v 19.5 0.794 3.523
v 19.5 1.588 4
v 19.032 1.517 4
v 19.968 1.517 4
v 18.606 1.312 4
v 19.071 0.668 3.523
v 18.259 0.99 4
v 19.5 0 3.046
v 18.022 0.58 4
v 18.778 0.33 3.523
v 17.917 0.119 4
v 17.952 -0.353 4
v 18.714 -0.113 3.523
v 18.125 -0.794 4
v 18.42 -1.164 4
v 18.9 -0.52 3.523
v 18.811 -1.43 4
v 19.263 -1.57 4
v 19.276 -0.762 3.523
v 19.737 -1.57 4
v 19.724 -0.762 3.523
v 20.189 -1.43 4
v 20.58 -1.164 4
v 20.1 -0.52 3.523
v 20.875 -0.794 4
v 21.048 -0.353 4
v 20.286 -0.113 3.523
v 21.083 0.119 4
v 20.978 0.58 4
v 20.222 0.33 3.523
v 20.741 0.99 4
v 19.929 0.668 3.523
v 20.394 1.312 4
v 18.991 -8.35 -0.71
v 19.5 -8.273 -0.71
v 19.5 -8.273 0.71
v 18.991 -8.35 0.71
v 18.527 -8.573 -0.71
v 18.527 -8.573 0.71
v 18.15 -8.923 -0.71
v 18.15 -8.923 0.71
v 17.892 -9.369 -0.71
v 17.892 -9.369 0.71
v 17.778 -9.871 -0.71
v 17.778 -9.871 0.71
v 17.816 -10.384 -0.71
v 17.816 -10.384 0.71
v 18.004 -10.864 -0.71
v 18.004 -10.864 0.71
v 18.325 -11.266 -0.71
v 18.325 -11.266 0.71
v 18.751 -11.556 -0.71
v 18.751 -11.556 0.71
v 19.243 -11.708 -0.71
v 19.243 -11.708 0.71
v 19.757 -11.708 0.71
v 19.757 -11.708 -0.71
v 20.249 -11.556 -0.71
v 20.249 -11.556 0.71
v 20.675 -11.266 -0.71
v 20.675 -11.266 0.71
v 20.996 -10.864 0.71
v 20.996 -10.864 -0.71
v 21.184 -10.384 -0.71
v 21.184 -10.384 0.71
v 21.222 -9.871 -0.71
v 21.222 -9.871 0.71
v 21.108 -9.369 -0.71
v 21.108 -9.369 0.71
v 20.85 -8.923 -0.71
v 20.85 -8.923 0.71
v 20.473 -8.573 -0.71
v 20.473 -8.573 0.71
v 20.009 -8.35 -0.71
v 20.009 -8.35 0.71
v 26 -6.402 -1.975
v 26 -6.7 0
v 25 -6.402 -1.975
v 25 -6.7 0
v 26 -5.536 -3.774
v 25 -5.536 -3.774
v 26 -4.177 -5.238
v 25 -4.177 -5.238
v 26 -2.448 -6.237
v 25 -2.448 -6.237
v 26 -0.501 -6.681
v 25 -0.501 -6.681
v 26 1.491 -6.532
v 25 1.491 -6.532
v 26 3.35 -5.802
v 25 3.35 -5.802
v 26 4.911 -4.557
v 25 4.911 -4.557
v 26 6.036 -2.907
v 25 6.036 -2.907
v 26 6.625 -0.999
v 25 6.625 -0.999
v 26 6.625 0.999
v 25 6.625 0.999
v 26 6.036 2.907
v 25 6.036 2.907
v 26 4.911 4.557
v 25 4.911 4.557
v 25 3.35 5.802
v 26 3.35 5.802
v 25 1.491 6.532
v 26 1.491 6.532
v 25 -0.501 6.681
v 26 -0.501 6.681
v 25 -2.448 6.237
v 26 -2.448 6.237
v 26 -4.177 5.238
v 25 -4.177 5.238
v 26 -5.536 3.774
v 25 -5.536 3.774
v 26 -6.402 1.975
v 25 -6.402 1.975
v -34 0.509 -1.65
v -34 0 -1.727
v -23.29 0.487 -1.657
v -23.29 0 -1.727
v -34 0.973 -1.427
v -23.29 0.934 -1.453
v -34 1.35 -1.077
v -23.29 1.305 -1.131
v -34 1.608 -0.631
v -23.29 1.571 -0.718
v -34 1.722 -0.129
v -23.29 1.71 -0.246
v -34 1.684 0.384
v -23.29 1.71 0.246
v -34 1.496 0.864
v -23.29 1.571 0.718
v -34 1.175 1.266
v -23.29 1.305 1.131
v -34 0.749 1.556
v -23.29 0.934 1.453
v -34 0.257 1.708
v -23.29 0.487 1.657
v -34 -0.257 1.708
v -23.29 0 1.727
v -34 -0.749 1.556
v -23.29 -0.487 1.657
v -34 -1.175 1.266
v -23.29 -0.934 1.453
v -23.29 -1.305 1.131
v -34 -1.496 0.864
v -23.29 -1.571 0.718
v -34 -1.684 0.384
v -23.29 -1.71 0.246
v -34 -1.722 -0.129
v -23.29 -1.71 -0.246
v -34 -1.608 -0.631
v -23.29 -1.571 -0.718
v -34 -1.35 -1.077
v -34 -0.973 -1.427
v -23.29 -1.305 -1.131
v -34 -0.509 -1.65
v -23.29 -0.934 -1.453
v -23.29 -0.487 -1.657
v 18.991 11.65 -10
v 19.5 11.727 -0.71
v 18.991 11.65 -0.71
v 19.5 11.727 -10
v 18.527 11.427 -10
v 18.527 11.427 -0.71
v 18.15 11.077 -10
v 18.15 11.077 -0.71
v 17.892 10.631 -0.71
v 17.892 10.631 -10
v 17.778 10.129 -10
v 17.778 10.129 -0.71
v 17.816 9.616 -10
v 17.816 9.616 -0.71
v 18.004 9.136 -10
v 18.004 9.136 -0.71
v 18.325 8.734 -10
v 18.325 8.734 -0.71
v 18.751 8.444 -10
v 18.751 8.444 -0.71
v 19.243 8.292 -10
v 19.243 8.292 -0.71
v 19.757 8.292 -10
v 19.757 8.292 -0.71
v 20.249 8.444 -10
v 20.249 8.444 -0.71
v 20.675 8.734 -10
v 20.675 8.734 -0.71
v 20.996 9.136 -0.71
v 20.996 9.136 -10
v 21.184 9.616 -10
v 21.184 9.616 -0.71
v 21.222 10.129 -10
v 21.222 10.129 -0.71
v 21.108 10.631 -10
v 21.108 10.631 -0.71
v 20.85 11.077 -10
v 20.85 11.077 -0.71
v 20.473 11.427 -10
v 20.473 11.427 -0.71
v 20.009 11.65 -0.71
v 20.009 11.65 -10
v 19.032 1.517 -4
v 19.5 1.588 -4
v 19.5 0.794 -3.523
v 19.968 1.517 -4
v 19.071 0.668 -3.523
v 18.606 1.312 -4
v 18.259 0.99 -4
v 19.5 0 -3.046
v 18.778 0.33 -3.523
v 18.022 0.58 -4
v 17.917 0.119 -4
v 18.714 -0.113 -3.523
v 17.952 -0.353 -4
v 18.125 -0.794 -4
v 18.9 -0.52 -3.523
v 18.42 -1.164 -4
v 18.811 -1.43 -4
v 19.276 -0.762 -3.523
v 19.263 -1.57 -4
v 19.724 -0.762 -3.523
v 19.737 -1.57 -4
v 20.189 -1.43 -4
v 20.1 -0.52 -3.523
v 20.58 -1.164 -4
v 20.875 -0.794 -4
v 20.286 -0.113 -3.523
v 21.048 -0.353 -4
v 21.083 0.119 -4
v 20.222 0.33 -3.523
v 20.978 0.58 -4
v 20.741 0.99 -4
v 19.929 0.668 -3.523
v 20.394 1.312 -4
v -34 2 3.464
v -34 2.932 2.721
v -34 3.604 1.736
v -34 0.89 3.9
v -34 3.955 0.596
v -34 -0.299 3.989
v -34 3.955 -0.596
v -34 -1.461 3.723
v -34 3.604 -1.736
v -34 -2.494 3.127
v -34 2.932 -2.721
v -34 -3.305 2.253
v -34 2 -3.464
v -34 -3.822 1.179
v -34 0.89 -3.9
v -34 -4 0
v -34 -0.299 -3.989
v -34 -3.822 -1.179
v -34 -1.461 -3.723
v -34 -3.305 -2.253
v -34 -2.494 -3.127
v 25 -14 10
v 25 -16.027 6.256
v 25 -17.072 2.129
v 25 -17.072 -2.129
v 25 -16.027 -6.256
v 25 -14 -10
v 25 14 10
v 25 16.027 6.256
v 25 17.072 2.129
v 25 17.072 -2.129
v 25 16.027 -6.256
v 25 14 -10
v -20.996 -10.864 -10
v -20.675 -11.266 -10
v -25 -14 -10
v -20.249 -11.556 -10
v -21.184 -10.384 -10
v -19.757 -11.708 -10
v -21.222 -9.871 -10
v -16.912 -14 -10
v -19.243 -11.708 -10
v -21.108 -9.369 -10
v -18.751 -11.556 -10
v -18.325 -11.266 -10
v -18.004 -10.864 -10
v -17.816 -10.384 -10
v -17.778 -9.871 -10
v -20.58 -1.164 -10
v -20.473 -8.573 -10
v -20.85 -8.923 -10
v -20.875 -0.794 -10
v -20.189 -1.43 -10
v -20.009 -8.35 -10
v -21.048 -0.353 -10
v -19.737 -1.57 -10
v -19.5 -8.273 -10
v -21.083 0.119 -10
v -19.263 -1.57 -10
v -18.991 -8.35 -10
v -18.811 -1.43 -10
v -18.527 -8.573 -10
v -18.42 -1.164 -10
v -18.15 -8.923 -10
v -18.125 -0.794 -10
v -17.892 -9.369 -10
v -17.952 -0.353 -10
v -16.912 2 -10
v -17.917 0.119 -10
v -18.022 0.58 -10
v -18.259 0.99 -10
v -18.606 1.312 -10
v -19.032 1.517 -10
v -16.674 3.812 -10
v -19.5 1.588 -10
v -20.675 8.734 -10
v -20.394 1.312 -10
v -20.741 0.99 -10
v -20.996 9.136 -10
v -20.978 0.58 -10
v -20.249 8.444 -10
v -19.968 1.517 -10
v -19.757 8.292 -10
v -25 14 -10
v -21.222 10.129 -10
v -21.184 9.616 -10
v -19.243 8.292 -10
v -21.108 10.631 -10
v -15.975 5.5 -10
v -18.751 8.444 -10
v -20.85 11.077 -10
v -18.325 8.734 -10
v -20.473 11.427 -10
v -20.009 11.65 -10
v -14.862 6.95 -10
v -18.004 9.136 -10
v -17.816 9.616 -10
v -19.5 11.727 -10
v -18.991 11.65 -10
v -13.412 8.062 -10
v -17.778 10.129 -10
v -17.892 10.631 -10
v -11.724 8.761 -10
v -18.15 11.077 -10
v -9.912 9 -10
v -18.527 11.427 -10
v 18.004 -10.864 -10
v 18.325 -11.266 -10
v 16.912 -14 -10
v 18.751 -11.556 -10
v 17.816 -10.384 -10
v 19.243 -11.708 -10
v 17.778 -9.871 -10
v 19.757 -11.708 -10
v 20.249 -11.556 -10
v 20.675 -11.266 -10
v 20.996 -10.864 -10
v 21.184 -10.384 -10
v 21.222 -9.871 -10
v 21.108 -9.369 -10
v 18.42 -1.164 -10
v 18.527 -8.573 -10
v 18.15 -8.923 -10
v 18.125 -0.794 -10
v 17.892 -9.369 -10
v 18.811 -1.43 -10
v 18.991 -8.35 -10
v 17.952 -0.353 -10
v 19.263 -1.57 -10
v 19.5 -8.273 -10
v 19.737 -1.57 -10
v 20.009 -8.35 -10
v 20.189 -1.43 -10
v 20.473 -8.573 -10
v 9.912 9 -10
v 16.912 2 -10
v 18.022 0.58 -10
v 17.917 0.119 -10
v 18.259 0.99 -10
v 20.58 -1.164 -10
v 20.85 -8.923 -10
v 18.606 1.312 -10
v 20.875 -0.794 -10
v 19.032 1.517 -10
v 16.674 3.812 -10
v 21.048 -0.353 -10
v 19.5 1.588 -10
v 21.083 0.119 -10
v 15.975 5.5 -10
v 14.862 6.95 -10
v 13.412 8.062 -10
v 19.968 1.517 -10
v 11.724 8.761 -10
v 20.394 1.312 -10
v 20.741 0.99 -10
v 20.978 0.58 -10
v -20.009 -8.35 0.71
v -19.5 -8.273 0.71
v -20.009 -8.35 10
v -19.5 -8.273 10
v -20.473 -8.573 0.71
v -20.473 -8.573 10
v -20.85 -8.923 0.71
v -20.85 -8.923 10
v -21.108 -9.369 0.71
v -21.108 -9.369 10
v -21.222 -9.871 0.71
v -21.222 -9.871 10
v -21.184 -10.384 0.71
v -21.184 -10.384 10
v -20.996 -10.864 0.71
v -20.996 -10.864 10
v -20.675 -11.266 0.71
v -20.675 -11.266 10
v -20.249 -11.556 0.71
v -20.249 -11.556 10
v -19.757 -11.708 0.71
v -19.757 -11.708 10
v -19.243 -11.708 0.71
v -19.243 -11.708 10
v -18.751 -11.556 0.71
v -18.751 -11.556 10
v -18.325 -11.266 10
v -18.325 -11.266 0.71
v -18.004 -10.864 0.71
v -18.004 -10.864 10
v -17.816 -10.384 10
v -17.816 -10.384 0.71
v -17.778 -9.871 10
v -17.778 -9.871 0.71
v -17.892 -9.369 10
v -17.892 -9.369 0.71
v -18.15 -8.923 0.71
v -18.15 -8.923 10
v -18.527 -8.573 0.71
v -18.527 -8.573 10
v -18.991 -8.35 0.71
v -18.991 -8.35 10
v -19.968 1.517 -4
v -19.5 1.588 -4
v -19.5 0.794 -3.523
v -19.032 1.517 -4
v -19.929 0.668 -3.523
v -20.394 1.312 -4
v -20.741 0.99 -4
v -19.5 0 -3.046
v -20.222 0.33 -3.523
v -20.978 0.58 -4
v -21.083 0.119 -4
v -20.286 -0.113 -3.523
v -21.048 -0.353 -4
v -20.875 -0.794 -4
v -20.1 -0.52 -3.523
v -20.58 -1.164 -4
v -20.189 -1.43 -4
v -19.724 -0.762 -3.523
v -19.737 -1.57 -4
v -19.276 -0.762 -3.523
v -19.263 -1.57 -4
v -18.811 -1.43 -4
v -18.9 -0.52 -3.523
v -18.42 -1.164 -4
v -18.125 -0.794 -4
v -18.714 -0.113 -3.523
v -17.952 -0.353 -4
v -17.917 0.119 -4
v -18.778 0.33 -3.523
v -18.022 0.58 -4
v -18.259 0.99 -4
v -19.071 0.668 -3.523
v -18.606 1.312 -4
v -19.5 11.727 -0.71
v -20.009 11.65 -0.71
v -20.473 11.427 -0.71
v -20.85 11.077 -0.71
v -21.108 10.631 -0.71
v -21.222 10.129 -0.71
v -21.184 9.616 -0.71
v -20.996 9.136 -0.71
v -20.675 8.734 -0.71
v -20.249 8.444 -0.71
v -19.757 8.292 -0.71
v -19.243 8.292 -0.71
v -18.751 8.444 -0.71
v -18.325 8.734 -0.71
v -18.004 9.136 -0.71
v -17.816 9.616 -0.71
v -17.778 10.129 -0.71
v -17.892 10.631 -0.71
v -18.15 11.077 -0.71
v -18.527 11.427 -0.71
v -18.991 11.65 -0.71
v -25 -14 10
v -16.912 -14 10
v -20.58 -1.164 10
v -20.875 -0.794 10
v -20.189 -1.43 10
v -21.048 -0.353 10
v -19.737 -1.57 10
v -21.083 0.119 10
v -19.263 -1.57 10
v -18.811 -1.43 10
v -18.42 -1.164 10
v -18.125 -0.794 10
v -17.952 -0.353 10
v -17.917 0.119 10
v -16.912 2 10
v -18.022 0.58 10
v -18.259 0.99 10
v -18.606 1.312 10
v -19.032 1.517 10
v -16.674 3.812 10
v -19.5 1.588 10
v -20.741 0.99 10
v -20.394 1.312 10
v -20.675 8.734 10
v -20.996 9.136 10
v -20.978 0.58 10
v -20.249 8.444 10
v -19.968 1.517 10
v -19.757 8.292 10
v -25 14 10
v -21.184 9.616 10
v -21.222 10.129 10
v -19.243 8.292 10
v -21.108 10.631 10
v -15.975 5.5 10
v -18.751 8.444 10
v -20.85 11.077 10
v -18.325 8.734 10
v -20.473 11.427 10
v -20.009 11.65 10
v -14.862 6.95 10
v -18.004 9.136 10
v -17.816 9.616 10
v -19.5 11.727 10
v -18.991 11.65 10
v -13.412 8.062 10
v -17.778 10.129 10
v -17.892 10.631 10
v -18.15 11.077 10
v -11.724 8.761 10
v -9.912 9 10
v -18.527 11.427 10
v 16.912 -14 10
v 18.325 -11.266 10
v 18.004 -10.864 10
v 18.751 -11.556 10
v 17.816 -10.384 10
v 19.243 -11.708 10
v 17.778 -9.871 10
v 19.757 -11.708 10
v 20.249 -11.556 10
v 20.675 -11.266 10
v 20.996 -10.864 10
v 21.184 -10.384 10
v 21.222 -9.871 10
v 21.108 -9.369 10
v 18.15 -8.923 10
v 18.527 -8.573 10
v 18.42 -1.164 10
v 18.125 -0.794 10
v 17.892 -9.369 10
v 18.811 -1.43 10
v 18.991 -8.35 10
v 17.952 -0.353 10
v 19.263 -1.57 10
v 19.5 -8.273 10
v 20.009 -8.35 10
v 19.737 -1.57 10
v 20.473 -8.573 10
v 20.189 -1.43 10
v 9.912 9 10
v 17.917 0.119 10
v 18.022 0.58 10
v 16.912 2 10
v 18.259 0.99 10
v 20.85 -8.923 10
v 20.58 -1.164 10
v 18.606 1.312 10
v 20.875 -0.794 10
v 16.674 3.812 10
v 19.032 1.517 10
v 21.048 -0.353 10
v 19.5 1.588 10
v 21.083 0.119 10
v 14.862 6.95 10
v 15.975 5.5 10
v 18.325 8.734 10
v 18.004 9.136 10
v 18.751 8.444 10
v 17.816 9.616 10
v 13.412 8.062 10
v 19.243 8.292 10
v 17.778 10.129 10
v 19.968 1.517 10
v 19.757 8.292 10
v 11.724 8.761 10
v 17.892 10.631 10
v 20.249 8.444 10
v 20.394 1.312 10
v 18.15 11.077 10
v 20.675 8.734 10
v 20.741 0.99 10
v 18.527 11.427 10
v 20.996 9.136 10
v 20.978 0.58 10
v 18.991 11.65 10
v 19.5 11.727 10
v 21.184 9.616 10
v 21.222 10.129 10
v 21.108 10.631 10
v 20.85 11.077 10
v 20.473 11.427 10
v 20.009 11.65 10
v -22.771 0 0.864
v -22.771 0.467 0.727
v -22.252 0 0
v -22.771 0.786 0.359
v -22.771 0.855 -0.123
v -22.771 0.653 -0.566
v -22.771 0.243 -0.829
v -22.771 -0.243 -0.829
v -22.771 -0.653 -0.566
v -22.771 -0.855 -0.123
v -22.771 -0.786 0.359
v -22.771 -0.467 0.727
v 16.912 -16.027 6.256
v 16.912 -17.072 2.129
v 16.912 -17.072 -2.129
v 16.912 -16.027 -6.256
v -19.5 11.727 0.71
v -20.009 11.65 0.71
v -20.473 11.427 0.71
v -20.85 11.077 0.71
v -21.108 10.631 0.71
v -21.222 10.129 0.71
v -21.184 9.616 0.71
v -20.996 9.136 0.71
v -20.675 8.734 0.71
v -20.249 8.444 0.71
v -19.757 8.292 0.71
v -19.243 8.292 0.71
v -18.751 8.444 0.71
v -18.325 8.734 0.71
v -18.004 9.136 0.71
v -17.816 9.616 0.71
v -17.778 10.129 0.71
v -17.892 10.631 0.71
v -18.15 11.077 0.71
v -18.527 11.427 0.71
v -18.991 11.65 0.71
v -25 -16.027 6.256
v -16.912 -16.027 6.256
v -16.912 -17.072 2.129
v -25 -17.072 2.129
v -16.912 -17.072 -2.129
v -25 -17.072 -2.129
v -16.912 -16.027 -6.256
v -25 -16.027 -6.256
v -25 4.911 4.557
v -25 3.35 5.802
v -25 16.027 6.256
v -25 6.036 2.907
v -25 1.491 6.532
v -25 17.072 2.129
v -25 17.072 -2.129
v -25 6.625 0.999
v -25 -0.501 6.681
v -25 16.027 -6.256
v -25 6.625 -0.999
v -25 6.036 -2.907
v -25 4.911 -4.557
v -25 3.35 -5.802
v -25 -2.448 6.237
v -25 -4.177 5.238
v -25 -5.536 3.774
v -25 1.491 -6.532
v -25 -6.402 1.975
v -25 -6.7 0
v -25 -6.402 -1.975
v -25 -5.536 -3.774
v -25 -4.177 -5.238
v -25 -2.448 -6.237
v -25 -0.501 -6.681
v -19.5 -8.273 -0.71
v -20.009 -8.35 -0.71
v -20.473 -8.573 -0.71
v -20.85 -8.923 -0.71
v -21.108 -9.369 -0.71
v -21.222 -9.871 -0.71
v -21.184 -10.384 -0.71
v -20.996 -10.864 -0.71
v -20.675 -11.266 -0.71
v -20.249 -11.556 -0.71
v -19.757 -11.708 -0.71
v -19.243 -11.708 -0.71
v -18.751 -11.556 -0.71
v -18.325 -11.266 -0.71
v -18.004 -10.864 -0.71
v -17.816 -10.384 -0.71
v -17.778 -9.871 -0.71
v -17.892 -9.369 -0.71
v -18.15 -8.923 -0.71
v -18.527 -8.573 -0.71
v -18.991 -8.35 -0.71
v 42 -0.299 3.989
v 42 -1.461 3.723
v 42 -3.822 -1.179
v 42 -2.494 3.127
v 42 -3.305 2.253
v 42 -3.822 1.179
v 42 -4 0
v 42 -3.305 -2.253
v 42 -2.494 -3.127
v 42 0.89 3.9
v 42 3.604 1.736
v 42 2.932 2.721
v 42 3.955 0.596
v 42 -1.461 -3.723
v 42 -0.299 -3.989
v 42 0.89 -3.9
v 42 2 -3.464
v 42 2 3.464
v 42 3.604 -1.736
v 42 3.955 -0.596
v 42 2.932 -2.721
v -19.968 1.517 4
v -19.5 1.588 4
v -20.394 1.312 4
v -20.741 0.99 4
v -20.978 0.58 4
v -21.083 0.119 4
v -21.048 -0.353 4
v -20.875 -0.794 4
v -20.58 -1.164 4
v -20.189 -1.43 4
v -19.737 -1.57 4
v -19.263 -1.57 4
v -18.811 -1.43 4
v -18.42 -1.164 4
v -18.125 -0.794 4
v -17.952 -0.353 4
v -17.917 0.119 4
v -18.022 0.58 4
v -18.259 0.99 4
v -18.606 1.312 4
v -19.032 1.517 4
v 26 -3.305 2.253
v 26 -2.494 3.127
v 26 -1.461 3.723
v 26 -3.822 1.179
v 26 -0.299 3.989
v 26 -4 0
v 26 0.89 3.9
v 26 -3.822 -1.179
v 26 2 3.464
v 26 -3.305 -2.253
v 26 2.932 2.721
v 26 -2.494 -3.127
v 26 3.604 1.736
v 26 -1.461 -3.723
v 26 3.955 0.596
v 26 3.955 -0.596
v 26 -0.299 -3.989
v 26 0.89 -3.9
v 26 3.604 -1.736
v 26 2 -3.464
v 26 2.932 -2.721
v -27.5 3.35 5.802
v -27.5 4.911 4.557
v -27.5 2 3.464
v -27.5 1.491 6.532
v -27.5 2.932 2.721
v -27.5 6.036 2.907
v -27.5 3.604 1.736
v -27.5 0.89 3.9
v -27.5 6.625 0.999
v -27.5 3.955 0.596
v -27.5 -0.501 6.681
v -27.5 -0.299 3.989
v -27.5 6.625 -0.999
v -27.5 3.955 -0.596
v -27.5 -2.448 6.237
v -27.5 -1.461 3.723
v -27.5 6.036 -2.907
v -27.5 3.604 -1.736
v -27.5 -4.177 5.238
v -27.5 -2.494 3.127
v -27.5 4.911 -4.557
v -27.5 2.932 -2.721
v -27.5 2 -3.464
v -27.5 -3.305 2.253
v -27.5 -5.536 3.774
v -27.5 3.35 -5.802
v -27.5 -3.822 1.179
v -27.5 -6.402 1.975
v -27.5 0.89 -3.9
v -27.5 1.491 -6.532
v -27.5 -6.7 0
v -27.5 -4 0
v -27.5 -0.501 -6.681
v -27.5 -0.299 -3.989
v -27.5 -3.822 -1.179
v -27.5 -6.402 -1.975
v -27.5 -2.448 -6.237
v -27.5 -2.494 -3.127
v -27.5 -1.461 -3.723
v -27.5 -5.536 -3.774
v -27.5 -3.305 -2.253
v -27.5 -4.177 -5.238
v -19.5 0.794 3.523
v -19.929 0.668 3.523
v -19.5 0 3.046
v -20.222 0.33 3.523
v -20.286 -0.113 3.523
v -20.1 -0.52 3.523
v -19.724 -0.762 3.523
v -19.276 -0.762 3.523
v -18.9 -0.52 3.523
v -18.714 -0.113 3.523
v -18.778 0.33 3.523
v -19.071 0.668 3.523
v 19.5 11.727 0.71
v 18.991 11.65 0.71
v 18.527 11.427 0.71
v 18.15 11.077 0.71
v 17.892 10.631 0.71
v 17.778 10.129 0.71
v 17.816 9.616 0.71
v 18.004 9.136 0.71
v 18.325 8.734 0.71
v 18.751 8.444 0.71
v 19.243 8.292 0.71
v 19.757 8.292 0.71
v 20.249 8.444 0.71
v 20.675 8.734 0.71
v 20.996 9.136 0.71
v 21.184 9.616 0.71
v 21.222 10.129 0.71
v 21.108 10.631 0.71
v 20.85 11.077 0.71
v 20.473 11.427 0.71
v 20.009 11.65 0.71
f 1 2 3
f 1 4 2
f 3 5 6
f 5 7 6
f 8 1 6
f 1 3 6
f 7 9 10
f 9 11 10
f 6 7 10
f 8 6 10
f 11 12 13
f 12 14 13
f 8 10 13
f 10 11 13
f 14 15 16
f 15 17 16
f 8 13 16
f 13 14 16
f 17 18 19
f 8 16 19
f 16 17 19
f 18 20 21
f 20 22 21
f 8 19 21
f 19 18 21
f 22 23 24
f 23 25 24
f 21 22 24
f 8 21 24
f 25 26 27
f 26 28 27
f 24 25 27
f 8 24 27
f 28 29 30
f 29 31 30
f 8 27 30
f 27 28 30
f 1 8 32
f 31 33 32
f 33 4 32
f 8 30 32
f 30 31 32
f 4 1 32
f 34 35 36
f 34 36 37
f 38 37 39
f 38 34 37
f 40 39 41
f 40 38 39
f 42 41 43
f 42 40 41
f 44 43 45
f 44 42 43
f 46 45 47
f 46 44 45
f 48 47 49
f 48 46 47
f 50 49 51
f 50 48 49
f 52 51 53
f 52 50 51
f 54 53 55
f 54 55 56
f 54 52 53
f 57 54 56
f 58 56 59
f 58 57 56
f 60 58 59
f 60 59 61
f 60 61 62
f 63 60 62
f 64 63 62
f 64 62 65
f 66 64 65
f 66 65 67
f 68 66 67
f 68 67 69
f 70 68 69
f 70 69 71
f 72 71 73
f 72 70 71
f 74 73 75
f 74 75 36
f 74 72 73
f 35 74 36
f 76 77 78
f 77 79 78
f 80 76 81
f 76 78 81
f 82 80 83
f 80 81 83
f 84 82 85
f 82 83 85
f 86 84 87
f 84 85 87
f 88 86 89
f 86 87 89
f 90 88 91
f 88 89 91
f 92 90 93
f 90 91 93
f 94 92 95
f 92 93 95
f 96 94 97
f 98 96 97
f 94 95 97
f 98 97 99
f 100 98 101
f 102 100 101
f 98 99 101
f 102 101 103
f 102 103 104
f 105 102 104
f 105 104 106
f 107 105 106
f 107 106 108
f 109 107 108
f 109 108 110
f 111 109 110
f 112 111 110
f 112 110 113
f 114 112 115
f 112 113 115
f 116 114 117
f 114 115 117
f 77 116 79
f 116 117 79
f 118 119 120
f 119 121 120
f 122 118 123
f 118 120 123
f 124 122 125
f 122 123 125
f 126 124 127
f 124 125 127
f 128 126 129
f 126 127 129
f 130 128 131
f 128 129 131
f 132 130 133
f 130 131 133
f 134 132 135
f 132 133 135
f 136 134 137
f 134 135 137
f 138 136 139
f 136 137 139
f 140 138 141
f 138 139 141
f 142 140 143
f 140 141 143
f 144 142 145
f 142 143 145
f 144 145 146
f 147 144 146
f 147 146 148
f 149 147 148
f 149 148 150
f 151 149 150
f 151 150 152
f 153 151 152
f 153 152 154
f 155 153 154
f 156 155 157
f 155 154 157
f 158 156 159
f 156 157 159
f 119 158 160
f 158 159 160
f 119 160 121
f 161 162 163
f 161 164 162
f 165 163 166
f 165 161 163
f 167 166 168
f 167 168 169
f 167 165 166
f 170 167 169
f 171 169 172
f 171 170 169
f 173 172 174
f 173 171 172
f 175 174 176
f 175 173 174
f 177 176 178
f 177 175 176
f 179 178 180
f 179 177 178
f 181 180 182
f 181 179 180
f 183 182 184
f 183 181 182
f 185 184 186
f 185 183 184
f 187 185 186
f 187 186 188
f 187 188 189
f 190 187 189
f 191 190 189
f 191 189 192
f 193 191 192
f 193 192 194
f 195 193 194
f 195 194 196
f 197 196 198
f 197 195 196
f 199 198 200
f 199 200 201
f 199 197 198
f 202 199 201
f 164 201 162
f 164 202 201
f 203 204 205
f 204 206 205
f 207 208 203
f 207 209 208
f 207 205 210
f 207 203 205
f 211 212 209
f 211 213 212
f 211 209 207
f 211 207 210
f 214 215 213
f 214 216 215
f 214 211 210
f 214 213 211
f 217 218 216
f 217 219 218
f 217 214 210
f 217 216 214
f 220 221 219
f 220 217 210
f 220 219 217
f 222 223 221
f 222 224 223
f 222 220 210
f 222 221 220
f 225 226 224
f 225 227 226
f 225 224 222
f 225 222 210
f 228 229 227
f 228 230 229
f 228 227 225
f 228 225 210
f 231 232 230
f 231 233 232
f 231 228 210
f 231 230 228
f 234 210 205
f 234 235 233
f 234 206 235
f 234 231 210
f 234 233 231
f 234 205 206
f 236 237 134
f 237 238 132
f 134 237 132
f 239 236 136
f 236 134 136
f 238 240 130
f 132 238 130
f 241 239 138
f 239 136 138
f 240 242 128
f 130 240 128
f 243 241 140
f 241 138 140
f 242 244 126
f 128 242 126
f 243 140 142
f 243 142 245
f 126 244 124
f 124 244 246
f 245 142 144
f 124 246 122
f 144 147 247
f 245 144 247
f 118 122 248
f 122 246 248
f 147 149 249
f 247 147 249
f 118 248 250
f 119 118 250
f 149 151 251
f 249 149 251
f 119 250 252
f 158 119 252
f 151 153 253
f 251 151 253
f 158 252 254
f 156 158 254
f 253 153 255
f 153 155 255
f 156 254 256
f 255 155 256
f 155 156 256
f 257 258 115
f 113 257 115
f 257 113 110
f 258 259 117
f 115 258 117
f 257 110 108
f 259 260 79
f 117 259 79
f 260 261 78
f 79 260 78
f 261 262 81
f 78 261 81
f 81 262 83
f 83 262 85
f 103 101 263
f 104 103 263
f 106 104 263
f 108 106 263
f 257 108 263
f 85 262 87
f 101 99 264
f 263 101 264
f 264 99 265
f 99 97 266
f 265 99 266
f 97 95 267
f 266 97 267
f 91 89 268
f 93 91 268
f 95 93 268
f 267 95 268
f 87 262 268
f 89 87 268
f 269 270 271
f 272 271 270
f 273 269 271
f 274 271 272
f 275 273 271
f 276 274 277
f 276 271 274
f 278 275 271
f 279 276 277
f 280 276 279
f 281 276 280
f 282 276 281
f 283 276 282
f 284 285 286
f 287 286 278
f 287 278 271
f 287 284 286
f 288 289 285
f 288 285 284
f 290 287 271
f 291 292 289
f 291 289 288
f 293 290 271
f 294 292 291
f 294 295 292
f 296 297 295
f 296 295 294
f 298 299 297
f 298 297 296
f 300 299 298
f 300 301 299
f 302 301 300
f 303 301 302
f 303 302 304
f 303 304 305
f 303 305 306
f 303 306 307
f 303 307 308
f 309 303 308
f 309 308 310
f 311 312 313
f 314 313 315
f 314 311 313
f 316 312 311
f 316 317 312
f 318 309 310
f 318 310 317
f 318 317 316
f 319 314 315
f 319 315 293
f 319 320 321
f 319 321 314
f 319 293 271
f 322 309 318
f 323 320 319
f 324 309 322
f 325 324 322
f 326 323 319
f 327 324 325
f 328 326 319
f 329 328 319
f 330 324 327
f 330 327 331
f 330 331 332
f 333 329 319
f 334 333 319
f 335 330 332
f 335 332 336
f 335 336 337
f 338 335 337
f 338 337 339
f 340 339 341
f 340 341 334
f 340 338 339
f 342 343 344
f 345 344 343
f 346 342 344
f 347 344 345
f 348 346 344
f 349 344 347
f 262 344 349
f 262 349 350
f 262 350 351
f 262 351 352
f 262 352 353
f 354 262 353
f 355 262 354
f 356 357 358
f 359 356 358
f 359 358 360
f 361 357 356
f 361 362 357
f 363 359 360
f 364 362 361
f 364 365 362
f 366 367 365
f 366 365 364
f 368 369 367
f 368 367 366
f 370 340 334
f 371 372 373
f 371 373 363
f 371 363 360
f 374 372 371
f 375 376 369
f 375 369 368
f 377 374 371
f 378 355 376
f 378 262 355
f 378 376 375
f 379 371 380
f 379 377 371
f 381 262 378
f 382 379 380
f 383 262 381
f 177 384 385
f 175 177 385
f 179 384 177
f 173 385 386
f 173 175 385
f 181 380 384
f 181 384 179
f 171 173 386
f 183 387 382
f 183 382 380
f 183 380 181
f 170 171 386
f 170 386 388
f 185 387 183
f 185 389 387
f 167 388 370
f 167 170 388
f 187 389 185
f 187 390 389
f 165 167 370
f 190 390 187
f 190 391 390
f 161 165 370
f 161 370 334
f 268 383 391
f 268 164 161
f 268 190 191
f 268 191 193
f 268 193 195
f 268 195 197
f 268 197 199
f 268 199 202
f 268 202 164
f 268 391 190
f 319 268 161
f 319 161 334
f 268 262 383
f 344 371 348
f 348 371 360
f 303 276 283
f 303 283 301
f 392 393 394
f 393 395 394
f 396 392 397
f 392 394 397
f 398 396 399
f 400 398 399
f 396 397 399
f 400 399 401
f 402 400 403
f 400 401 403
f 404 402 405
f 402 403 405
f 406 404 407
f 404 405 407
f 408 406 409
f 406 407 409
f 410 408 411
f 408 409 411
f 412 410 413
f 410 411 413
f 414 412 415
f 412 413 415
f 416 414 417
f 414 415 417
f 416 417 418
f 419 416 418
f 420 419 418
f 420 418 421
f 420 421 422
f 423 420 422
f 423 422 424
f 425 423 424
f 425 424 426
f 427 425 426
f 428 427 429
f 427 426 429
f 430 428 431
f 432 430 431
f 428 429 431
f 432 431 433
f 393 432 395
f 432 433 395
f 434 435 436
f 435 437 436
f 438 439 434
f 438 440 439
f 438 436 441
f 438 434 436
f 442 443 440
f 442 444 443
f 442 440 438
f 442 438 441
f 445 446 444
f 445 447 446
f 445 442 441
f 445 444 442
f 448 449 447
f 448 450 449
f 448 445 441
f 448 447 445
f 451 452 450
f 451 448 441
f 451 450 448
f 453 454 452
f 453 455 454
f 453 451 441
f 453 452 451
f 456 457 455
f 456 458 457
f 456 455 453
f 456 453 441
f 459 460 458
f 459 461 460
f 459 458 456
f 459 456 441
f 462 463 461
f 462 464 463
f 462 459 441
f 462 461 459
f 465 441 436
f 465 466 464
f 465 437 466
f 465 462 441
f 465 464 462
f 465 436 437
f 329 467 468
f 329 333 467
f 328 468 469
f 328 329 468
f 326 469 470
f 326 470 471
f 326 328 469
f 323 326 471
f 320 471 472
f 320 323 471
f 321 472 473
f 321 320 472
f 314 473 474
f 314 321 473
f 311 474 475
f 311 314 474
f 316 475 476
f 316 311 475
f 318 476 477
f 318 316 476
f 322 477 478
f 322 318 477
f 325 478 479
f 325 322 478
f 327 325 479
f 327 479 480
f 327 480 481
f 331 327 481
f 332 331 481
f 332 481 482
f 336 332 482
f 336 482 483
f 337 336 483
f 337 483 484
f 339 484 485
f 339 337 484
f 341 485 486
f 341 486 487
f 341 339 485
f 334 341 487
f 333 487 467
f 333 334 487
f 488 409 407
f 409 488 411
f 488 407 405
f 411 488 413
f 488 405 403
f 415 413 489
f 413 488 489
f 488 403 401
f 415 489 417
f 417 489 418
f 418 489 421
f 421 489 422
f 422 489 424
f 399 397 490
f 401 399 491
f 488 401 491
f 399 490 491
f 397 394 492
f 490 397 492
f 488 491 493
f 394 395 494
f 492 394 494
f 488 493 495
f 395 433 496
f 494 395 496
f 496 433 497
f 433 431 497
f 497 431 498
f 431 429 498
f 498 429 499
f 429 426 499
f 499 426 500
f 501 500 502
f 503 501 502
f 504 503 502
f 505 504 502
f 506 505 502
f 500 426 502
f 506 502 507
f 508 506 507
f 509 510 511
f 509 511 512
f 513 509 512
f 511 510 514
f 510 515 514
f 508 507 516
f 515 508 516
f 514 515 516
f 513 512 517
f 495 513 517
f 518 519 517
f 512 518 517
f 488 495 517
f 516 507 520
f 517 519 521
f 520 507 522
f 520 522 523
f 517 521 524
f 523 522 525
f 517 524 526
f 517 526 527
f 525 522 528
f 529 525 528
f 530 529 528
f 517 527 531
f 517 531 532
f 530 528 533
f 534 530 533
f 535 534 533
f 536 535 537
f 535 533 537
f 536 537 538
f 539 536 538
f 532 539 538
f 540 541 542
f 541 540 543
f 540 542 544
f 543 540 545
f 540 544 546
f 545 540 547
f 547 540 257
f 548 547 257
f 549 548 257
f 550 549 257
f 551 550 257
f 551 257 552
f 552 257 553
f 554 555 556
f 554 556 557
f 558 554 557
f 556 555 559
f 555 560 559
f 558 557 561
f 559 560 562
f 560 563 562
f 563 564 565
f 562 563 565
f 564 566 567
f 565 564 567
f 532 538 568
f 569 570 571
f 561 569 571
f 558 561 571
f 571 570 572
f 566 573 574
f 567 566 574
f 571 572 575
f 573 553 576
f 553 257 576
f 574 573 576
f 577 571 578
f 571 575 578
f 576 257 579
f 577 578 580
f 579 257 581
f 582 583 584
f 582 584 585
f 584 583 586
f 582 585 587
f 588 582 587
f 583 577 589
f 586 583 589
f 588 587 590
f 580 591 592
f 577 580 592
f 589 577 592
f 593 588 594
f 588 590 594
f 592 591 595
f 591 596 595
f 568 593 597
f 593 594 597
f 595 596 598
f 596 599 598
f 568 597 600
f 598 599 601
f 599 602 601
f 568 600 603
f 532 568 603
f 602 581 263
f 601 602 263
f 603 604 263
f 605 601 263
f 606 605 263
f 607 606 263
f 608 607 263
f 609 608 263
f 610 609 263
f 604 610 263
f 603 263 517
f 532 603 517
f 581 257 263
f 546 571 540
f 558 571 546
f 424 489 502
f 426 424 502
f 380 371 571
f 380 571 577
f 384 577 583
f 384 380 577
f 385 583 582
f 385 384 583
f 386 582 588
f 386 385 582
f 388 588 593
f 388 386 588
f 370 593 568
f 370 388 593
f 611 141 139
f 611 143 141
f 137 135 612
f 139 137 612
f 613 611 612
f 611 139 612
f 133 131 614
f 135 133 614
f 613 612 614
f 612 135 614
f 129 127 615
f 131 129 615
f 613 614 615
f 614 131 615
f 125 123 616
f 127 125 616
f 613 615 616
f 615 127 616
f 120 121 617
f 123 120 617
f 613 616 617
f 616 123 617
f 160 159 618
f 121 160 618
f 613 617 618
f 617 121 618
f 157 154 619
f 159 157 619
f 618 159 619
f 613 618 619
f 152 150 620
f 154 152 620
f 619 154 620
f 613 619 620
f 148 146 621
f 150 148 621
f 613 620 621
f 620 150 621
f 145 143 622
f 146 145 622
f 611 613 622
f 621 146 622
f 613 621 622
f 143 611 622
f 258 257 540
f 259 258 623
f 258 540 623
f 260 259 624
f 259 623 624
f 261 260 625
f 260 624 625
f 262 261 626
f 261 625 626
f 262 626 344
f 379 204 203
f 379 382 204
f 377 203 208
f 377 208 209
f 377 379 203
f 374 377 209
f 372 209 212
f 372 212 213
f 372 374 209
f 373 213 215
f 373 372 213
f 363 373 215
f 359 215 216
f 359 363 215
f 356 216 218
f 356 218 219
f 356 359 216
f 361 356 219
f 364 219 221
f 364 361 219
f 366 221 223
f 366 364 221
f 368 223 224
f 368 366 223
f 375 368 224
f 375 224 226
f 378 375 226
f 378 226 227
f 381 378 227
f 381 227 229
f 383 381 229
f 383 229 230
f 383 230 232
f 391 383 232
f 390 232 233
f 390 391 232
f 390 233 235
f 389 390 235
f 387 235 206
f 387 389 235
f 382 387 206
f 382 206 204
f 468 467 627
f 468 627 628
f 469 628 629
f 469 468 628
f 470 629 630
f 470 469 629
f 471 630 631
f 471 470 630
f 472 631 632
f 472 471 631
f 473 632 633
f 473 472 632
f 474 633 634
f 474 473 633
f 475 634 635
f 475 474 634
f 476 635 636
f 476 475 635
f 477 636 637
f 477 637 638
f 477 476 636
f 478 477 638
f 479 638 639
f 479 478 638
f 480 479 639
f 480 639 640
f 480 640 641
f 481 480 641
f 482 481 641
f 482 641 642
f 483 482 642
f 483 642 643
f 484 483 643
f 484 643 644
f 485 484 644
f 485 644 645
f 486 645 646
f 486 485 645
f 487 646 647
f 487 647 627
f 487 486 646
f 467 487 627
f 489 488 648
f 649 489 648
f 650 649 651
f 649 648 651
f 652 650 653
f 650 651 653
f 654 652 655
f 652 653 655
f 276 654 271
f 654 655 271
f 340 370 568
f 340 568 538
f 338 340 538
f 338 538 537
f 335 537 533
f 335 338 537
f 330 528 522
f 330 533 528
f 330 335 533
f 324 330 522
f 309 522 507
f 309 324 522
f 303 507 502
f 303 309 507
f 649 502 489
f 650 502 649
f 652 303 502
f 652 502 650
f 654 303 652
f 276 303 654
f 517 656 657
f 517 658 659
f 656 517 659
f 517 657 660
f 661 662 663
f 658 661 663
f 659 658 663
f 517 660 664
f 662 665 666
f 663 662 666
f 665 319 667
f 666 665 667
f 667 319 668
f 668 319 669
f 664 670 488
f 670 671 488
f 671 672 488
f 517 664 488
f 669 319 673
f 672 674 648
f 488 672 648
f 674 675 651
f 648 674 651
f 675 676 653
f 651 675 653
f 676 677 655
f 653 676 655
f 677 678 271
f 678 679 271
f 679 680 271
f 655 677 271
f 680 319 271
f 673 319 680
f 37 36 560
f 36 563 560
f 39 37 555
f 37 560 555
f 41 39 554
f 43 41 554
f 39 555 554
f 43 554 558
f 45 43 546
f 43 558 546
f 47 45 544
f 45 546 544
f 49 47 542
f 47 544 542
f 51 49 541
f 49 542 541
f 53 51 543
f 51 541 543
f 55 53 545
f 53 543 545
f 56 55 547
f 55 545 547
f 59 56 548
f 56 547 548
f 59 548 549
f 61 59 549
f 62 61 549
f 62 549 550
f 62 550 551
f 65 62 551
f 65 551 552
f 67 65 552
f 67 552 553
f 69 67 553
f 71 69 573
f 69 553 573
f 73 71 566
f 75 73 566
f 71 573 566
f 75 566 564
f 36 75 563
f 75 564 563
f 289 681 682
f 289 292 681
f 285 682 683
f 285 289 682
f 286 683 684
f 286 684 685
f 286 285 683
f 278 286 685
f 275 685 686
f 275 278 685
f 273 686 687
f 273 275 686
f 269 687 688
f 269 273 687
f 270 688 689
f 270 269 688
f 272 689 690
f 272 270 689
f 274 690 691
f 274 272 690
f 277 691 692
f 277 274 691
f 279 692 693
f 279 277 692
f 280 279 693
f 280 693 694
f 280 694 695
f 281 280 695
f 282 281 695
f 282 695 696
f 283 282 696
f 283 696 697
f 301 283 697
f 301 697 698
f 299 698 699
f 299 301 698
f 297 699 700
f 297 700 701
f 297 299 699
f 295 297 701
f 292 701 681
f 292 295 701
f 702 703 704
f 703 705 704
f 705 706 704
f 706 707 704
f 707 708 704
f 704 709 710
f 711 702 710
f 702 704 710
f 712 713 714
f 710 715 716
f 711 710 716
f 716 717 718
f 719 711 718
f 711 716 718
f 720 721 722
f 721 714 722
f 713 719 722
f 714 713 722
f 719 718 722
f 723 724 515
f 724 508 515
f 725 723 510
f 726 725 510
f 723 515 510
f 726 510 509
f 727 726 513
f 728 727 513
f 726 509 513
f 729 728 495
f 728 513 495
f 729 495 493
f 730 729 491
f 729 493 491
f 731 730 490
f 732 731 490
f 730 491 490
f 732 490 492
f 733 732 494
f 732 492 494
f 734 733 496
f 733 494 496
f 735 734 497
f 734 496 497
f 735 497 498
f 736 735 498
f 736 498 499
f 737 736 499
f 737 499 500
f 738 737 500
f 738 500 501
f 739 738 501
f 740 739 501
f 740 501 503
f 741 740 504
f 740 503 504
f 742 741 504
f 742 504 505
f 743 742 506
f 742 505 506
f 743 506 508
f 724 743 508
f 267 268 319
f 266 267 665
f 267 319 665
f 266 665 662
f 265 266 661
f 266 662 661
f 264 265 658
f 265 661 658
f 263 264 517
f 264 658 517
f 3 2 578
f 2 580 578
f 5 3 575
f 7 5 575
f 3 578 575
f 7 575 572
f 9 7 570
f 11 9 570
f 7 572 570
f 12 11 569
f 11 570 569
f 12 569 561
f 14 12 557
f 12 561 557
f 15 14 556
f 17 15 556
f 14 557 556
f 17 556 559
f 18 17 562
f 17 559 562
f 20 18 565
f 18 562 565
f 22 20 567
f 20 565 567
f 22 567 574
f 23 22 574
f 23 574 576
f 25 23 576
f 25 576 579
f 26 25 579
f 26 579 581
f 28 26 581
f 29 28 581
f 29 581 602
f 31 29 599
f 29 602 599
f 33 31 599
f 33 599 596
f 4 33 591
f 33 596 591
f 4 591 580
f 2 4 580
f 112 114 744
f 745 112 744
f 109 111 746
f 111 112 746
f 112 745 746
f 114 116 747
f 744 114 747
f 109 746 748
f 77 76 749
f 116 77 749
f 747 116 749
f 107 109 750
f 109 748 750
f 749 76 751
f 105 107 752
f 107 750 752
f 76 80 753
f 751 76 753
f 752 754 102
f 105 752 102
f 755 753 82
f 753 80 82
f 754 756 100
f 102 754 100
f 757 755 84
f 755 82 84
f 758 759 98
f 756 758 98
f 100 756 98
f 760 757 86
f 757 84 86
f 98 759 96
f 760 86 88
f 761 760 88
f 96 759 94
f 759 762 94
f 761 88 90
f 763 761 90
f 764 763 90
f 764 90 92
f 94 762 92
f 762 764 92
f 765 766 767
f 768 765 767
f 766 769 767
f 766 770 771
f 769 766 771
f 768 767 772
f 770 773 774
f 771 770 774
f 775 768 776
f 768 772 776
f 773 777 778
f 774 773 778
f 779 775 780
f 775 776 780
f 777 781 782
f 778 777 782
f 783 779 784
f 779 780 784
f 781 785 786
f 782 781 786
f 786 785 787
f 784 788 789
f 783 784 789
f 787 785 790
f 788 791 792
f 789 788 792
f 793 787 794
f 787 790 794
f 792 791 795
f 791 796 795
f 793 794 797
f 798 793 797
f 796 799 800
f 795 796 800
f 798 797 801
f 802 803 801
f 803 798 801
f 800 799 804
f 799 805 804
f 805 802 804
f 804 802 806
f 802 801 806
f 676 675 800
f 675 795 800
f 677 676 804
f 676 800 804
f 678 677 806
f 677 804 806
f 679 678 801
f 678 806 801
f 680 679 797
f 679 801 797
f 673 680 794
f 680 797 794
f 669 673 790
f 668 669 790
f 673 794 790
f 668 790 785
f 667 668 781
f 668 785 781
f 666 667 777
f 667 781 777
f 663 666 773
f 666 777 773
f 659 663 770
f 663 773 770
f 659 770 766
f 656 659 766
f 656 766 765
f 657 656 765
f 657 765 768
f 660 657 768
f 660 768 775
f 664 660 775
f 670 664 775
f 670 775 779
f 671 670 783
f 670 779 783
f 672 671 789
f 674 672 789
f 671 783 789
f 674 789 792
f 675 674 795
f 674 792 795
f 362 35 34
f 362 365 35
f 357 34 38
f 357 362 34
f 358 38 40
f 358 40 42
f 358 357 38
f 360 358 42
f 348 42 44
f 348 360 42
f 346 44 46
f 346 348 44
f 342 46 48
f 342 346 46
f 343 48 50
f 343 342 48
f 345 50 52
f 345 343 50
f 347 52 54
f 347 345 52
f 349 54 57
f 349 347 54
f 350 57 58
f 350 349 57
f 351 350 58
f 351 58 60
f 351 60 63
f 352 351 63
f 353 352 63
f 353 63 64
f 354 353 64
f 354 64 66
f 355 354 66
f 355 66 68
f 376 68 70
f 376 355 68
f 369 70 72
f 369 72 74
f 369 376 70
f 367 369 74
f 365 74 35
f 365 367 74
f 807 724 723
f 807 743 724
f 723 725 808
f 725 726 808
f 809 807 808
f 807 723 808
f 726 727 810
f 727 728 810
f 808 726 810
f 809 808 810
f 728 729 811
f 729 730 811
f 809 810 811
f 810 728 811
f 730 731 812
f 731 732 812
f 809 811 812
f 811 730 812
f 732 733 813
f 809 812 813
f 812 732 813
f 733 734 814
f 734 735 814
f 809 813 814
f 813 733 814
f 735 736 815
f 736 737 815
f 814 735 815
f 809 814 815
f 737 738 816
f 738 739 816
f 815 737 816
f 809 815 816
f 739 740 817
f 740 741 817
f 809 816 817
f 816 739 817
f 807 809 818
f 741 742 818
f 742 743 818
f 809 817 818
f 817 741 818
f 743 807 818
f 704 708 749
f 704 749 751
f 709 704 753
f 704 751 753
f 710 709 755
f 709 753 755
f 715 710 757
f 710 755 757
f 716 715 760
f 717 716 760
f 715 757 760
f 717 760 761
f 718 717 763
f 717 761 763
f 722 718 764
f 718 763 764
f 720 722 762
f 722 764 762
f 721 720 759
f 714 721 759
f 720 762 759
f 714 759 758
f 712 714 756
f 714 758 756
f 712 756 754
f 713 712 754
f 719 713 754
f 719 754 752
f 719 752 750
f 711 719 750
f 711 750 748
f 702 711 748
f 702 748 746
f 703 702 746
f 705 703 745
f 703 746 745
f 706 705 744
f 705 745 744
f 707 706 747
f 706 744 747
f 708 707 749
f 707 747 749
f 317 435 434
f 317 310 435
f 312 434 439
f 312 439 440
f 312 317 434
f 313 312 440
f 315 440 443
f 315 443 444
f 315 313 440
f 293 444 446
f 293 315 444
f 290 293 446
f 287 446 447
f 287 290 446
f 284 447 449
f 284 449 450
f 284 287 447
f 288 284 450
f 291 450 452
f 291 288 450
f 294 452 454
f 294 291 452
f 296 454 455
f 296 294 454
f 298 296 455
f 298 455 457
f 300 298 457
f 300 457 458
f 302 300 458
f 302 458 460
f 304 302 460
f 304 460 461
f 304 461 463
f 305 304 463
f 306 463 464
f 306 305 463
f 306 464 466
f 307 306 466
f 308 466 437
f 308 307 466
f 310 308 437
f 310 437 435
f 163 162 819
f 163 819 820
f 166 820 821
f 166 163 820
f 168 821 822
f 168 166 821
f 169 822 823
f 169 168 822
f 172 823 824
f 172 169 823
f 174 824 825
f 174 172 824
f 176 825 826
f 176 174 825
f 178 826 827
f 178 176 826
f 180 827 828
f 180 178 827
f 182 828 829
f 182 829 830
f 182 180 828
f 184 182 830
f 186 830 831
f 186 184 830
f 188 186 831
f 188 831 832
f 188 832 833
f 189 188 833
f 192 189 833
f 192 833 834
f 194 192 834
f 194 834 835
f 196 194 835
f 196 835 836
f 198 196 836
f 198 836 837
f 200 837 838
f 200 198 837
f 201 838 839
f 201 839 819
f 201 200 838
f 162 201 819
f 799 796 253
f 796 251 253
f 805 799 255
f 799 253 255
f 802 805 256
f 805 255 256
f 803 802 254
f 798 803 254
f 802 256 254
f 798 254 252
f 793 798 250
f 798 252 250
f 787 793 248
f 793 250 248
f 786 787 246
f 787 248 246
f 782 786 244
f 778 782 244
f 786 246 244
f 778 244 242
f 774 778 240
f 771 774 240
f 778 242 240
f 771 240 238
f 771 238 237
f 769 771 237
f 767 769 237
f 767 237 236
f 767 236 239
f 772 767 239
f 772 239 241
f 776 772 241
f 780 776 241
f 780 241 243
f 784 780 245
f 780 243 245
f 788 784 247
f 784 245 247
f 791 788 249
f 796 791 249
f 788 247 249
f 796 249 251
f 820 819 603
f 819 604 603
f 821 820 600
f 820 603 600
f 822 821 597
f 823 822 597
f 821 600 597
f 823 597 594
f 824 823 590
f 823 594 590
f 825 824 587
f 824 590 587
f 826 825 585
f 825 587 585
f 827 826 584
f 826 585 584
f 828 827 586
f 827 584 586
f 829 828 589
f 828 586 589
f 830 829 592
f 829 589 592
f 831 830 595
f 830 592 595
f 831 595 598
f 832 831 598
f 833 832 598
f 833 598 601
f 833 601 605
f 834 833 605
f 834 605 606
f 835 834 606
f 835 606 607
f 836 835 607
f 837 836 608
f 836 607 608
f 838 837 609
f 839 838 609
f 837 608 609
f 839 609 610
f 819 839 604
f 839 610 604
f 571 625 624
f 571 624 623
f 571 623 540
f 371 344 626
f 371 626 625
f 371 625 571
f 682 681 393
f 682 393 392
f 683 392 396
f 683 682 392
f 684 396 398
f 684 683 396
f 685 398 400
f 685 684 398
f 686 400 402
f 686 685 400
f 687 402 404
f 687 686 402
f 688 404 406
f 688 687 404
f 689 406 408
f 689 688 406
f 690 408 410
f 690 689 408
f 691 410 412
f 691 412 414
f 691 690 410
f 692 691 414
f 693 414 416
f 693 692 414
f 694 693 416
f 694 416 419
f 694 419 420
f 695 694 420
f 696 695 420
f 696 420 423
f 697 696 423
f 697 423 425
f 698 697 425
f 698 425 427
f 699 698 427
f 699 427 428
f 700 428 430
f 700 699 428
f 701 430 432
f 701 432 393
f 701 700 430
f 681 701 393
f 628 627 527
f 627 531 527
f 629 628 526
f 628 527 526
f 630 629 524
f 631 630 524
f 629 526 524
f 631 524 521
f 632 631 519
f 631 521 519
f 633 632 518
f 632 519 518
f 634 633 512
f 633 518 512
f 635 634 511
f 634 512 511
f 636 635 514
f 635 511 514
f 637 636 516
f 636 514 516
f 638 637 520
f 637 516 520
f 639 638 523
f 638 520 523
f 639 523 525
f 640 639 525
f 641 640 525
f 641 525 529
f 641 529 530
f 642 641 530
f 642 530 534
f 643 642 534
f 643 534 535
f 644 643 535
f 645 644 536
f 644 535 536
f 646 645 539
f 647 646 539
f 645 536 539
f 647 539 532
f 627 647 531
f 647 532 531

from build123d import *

# Parameters (mm, degrees)
CUT_EXTRUDE1_DEPTH                  = 72.281133549
CUT_EXTRUDE1_DEPTH_BACK             = 72.281133549
SKETCH3_OUTSIDE_W                   = 54.458
SKETCH3_OUTSIDE_H                   = 54.458
SKETCH3_OUTSIDE_W_2                 = 20
SKETCH3_OUTSIDE_H_2                 = 34.409301068
F_8_32_TAPPED_HOLE1_AT_2_COUNT      = 2
F_8_32_TAPPED_HOLE1_AT_2_PITCH      = 43.829214002
F_8_32_TAPPED_HOLE1_AT_3_COUNT      = 2
F_8_32_TAPPED_HOLE1_AT_3_PITCH      = 20
F_8_32_TAPPED_HOLE1_AT_4_COUNT      = 2
F_8_32_TAPPED_HOLE1_AT_4_PITCH      = 39
F_1_8_0_1250_DOWEL_HOLE1_AT_2_COUNT = 2
F_1_8_0_1250_DOWEL_HOLE1_AT_2_PITCH = 39
F_8_32_TAPPED_HOLE2_D               = 3.4544
F_8_32_TAPPED_HOLE2_DEPTH           = 10.71
F_8_32_TAPPED_HOLE2_TIP             = 1.037806461
CUT_EXTRUDE3_DEPTH                  = 50.598387071
CUT_EXTRUDE3_DEPTH_BACK             = 50.598387071


with BuildPart() as part:
    # Sketch2 → Revolve1 (revolve)
    with BuildSketch(Plane.XY, mode=Mode.PRIVATE) as revolve1_sk:
        Polygon((-34, 0), (42, 0), (42, 4), (26, 4), (26, 6.7), (25, 6.7), (25, 17.204650534), (-25, 17.204650534), (-25, 6.7), (-27.5, 6.7), (-27.5, 4), (-34, 4), align=None)
    revolve(revolve1_sk.sketch.rotate(Axis((-34, 0, 0), (1, 0, 0)), 180), axis=Axis((-34, 0, 0), (1, 0, 0)))

    # Sketch3 outside → Cut-Extrude1 (cut, two sides: drawn at the far end of the back side and taken through both)
    with BuildSketch(Plane.ZY.offset(25).offset(-CUT_EXTRUDE1_DEPTH_BACK)):
        Rectangle(SKETCH3_OUTSIDE_W, SKETCH3_OUTSIDE_H)
        Rectangle(SKETCH3_OUTSIDE_W_2, SKETCH3_OUTSIDE_H_2, mode=Mode.SUBTRACT)
    extrude(amount=CUT_EXTRUDE1_DEPTH + CUT_EXTRUDE1_DEPTH_BACK, mode=Mode.SUBTRACT)

    # Sketch5 → #8-32 Tapped Hole1 (revolve, cut)
    with BuildSketch(Plane(origin=(19.5, 10, -10), x_dir=(0, 1, 0), z_dir=(1, 0, 0))):
        Polygon((0, 0), (0, 11.747806461), (1.7272, 10.71), (1.7272, 0), align=None)
    f_8_32_tapped_hole1 = revolve(axis=Axis((19.5, 10, -16.35), (0, 0, 1)), mode=Mode.SUBTRACT)

    # #8-32 Tapped Hole1 at 2: #8-32 Tapped Hole1 ×2
    with Locations(*[Vector(-0.889817462812737, -0.4563166475962754, 0) * (i * F_8_32_TAPPED_HOLE1_AT_2_PITCH) for i in range(1, F_8_32_TAPPED_HOLE1_AT_2_COUNT)]):
        add(f_8_32_tapped_hole1, mode=Mode.SUBTRACT)

    # #8-32 Tapped Hole1 at 3: #8-32 Tapped Hole1 ×2
    with Locations(*[(0, -i * F_8_32_TAPPED_HOLE1_AT_3_PITCH, 0) for i in range(1, F_8_32_TAPPED_HOLE1_AT_3_COUNT)]):
        add(f_8_32_tapped_hole1, mode=Mode.SUBTRACT)

    # #8-32 Tapped Hole1 at 4: #8-32 Tapped Hole1 ×2
    with Locations(*[(-i * F_8_32_TAPPED_HOLE1_AT_4_PITCH, 0, 0) for i in range(1, F_8_32_TAPPED_HOLE1_AT_4_COUNT)]):
        add(f_8_32_tapped_hole1, mode=Mode.SUBTRACT)

    # Sketch7 → 1/8 (0.1250) Dowel Hole1 (revolve, cut)
    with BuildSketch(Plane(origin=(19.5, 0, -10), x_dir=(0, 1, 0), z_dir=(1, 0, 0))):
        Polygon((0, 0), (0, 6.953866233), (1.5875, 6), (1.5875, 0), align=None)
    f_1_8_0_1250_dowel_hole1 = revolve(axis=Axis((19.5, 0, -16.35), (0, 0, 1)), mode=Mode.SUBTRACT)

    # 1/8 (0.1250) Dowel Hole1 at 2: 1/8 (0.1250) Dowel Hole1 ×2
    with Locations(*[(-i * F_1_8_0_1250_DOWEL_HOLE1_AT_2_PITCH, 0, 0) for i in range(1, F_1_8_0_1250_DOWEL_HOLE1_AT_2_COUNT)]):
        add(f_1_8_0_1250_dowel_hole1, mode=Mode.SUBTRACT)

    # Mirror1: #8-32 Tapped Hole1, 1/8 (0.1250) Dowel Hole1 across plane
    add(f_8_32_tapped_hole1.mirror(Plane.XY), mode=Mode.SUBTRACT)
    add(f_1_8_0_1250_dowel_hole1.mirror(Plane.XY), mode=Mode.SUBTRACT)

    # Mirror1 copy 1 sketch → Mirror1 copy 1 (revolve, cut)
    with BuildSketch(Plane(origin=(-19.5, -10, 10), x_dir=(0, 1, 0), z_dir=(1, 0, 0))):
        Polygon((0, 0), (0, -11.747806461), (1.7272, -10.71), (1.7272, 0), align=None)
    revolve(axis=Axis((-19.5, -10, 16.35), (0, 0, 1)), mode=Mode.SUBTRACT)

    # Mirror1 copy 2 sketch → Mirror1 copy 2 (revolve, cut)
    with BuildSketch(Plane(origin=(19.5, -10, 10), x_dir=(0, 1, 0), z_dir=(1, 0, 0))):
        Polygon((0, 0), (0, -11.747806461), (1.7272, -10.71), (1.7272, 0), align=None)
    revolve(axis=Axis((19.5, -10, 16.35), (0, 0, 1)), mode=Mode.SUBTRACT)

    # Mirror1 copy 3 sketch → Mirror1 copy 3 (revolve, cut)
    with BuildSketch(Plane(origin=(-19.5, 10, 10), x_dir=(0, 1, 0), z_dir=(1, 0, 0))):
        Polygon((0, 0), (0, -11.747806461), (1.7272, -10.71), (1.7272, 0), align=None)
    revolve(axis=Axis((-19.5, 10, 16.35), (0, 0, 1)), mode=Mode.SUBTRACT)

    # Mirror1 copy 4 sketch → Mirror1 copy 4 (revolve, cut)
    with BuildSketch(Plane(origin=(-19.5, 0, 10), x_dir=(0, 1, 0), z_dir=(1, 0, 0))):
        Polygon((0, 0), (0, -6.953866233), (1.5875, -6), (1.5875, 0), align=None)
    revolve(axis=Axis((-19.5, 0, 16.35), (0, 0, 1)), mode=Mode.SUBTRACT)

    # #8-32 Tapped Hole2
    with Locations(Plane.ZY.offset(34)):
        with Locations((0, 0)):
            Hole(F_8_32_TAPPED_HOLE2_D / 2, depth=F_8_32_TAPPED_HOLE2_DEPTH)
            with Locations((0, 0, -(F_8_32_TAPPED_HOLE2_DEPTH + F_8_32_TAPPED_HOLE2_TIP / 2))):  # 118° drill point
                Cone(0, F_8_32_TAPPED_HOLE2_D / 2, F_8_32_TAPPED_HOLE2_TIP, mode=Mode.SUBTRACT)

    # Sketch12 → Cut-Extrude3 (cut, two sides: drawn at the far end of the back side and taken through both)
    with BuildSketch(Plane.XY.offset(10).offset(-CUT_EXTRUDE3_DEPTH_BACK)):
        with BuildLine():
            Line((-9.9125, -37.391646785), (9.9125, -37.391646785))
            ThreePointArc((9.9125, -37.391646785), (14.862247468, -35.341394253), (16.9125, -30.391646785))
            Line((16.9125, -30.391646785), (16.9125, 2))
            ThreePointArc((16.9125, 2), (14.862247468, 6.949747468), (9.9125, 9))
            Line((9.9125, 9), (-9.9125, 9))
            ThreePointArc((-9.9125, 9), (-14.862247468, 6.949747468), (-16.9125, 2))
            Line((-16.9125, 2), (-16.9125, -30.391646785))
            ThreePointArc((-16.9125, -30.391646785), (-14.862247468, -35.341394253), (-9.9125, -37.391646785))
        make_face()
    extrude(amount=CUT_EXTRUDE3_DEPTH + CUT_EXTRUDE3_DEPTH_BACK, mode=Mode.SUBTRACT)


solid = part.part
